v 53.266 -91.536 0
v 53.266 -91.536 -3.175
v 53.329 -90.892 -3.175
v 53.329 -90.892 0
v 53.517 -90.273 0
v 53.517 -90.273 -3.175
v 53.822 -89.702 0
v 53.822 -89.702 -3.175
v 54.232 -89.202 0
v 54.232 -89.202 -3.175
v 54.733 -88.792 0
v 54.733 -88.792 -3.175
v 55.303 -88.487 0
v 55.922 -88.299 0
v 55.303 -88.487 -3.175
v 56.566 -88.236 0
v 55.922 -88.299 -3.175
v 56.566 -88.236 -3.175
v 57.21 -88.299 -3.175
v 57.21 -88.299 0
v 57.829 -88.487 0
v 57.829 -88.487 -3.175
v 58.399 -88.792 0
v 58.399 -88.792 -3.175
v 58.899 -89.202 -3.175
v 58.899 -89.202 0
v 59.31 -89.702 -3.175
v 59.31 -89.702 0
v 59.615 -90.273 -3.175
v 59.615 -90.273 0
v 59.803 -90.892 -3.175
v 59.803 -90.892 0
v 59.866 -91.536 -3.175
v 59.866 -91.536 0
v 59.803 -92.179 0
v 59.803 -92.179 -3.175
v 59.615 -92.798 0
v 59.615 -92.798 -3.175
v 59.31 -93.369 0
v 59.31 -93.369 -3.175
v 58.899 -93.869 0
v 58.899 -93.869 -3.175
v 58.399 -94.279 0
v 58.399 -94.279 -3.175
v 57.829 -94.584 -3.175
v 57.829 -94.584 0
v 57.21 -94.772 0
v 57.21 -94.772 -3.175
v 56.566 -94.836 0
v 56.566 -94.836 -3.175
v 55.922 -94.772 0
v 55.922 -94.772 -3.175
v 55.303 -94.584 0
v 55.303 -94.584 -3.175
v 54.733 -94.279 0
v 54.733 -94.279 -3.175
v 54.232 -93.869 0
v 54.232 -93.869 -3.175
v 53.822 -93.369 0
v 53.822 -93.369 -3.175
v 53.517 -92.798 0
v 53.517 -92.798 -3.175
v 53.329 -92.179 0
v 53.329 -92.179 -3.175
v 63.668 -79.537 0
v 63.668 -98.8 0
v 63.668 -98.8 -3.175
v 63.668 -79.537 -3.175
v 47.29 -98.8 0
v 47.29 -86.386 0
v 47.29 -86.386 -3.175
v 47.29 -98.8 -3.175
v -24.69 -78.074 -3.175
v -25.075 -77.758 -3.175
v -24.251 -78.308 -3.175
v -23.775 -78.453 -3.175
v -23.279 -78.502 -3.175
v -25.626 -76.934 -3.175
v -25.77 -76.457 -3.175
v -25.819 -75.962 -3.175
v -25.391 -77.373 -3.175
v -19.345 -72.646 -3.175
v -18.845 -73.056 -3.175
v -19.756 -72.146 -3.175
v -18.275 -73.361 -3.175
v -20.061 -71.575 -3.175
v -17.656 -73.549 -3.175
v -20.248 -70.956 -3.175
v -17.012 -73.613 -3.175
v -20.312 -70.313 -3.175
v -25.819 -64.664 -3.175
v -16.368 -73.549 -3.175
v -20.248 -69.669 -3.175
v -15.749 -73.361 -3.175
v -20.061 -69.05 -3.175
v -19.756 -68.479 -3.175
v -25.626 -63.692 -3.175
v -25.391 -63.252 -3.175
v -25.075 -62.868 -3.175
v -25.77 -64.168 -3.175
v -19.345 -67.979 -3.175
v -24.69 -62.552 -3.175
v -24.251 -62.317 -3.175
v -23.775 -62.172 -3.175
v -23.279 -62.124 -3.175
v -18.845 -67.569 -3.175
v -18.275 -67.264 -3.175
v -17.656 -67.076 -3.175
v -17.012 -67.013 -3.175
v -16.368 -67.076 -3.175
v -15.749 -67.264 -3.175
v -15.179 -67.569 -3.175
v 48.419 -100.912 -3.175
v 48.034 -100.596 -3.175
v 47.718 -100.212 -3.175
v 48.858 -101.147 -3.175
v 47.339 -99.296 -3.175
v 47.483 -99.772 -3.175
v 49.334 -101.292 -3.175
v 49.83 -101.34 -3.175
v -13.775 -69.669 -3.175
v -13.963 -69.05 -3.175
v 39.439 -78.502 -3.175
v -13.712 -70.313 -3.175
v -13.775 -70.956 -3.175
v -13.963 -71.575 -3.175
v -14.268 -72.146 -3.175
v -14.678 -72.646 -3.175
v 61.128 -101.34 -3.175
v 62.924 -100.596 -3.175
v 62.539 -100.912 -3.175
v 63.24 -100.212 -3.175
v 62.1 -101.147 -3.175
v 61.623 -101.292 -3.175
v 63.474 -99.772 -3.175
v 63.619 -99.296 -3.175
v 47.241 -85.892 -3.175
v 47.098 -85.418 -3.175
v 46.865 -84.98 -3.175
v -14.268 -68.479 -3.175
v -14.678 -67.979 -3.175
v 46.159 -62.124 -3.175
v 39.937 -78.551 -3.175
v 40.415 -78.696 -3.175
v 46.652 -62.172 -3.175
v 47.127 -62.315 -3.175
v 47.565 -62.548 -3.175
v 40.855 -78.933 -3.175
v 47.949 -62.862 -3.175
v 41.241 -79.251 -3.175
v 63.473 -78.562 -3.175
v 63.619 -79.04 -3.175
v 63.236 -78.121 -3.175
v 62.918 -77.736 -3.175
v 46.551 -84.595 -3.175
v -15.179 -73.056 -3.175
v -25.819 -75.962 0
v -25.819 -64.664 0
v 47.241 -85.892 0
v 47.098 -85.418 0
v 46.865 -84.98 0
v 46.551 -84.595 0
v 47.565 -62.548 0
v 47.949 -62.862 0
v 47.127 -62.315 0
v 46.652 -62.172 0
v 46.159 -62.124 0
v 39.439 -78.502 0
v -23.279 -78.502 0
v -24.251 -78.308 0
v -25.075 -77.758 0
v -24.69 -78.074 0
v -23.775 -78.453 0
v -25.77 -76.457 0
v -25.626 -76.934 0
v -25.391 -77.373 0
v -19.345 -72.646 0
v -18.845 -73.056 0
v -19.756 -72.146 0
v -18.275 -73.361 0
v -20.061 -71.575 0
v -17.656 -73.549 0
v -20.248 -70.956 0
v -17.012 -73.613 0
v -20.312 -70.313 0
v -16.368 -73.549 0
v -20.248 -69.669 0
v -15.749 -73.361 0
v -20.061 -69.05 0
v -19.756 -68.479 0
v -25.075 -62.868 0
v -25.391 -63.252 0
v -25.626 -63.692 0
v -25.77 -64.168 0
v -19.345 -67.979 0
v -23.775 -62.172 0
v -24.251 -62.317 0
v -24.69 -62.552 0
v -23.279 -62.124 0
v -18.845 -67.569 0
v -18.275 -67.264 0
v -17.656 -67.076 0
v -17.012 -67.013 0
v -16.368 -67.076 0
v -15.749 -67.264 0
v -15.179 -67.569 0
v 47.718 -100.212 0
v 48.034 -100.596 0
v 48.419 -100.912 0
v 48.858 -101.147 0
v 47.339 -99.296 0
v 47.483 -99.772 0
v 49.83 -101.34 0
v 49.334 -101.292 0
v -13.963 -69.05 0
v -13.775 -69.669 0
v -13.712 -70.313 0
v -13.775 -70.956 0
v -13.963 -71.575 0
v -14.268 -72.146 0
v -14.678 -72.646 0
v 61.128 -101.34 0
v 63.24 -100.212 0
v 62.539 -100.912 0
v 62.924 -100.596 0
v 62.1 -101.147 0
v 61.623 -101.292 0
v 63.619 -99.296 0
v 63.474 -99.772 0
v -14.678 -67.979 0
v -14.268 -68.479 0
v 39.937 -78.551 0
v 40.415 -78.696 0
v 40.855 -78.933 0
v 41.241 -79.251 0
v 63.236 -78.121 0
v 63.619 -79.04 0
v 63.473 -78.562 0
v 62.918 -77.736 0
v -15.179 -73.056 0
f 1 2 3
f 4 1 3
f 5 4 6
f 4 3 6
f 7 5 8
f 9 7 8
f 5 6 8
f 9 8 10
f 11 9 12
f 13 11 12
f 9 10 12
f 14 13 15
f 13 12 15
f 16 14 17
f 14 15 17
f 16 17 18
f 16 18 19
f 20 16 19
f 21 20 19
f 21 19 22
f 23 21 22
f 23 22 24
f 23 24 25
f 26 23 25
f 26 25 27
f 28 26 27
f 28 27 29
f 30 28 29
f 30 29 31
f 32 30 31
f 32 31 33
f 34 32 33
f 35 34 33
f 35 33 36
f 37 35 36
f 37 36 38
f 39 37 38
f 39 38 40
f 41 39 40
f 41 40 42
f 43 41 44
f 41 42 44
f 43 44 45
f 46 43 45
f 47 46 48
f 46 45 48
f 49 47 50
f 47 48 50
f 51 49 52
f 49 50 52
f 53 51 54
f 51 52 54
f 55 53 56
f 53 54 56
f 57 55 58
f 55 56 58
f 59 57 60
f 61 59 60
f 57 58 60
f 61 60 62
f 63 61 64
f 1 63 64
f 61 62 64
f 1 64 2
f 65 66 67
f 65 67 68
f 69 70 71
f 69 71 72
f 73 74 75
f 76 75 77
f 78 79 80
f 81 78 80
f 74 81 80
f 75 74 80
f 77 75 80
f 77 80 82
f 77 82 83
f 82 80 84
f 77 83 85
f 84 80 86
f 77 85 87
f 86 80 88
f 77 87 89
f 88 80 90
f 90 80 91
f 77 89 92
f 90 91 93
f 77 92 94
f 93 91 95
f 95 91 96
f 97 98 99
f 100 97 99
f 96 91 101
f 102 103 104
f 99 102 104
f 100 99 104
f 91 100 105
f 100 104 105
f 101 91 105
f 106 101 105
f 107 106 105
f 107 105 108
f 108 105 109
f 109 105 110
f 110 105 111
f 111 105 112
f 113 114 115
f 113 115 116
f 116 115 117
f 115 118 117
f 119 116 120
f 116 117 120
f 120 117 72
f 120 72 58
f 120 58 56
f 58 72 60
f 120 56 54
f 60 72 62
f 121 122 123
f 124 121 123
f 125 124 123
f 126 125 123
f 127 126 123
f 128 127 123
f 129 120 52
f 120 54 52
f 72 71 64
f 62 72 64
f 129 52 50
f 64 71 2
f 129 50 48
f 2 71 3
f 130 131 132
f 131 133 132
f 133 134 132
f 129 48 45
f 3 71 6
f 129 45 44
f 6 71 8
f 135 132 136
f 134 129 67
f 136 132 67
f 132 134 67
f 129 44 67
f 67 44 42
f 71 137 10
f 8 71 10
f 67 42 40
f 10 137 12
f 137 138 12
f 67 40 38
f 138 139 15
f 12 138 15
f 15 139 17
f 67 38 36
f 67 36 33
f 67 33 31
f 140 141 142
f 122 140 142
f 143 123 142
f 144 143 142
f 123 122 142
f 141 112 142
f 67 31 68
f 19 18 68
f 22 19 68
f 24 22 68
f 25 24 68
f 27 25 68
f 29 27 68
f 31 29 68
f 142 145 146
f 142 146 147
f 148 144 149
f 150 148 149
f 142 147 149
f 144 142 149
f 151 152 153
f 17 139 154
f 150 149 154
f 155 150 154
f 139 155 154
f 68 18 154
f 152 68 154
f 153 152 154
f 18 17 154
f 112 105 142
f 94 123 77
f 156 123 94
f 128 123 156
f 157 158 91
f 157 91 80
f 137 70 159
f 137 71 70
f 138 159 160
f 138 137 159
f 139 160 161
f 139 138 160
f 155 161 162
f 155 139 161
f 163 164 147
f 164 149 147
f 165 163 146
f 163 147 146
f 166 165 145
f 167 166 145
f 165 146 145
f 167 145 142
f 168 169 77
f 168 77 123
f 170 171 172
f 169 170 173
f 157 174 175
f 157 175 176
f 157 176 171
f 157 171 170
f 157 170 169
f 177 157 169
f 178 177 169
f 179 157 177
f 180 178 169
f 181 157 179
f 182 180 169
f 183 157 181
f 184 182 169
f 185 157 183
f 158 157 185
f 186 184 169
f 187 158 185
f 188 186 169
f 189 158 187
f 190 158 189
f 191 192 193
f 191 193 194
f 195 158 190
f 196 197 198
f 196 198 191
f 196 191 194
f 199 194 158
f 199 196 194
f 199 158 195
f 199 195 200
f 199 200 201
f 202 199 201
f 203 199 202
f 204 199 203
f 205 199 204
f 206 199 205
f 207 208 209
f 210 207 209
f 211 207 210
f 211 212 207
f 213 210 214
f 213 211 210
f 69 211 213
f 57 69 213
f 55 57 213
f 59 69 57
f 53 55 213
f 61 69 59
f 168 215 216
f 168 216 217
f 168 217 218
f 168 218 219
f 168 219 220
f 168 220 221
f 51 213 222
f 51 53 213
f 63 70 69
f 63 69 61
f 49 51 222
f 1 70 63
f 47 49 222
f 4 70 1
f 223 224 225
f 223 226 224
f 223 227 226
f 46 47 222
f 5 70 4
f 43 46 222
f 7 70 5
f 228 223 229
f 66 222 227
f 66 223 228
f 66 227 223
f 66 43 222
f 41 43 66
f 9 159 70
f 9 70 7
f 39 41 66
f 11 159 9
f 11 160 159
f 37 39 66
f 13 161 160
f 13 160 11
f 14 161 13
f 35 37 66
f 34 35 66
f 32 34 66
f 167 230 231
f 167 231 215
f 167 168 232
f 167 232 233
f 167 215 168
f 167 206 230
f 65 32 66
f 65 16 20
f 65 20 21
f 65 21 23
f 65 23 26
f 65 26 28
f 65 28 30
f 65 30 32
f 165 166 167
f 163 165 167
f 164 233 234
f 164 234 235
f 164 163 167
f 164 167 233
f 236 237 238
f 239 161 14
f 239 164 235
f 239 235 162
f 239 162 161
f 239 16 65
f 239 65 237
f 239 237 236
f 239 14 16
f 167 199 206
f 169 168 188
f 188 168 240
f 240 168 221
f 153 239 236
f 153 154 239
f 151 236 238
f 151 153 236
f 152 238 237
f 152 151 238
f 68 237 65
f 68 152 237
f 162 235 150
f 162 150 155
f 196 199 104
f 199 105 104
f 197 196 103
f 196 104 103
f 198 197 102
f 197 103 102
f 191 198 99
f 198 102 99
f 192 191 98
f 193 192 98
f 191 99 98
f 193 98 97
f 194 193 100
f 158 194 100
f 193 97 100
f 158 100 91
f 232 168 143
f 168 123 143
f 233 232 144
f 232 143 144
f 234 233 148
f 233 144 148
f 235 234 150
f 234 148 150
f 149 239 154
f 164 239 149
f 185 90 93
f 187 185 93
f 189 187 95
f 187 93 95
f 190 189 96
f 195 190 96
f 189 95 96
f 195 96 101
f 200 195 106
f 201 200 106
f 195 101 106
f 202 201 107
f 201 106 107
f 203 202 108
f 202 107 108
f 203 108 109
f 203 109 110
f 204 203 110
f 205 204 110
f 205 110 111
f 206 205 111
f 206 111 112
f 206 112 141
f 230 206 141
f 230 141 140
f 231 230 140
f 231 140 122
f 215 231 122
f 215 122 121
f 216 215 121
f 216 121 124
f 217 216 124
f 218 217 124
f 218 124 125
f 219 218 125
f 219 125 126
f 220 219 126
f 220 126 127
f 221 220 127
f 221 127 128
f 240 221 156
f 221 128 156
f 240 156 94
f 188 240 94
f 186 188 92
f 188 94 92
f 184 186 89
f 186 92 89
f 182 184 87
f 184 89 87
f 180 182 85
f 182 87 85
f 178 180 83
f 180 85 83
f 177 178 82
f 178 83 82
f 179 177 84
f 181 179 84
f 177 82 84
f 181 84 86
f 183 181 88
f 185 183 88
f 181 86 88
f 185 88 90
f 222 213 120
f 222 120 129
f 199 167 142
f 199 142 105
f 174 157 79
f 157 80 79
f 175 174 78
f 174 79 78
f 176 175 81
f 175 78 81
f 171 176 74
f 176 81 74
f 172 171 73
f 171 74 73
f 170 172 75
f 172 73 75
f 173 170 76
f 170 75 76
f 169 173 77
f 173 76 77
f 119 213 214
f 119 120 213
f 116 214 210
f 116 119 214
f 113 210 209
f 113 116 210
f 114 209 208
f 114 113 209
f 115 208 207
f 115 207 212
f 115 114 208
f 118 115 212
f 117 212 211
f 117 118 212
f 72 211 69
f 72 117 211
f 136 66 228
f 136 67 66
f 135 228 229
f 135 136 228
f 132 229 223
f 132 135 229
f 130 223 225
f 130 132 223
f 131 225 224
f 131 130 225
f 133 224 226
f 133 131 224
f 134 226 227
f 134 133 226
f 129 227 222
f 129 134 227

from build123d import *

# Parameters (mm, degrees)
BASE_FLANGE1_DEPTH   = 3.175
M6_CLEARANCE_HOLE1_D = 6.6
FILLET1_R            = 2.54


# Sheet-metal steps are written as plain solids
with BuildPart() as part:
    # Sketch1 → Base-Flange1 (new body)
    with BuildSketch(Plane.XY):
        Polygon((63.66772505, -78.480441727), (47.205847983, -62.123600001), (-25.819152017, -62.123600001), (-25.819152017, -78.501600001), (40.496105752, -78.501600001), (47.28972505, -85.338441727), (47.28972505, -101.340441727), (63.66772505, -101.340441727), align=None)
    extrude(amount=-BASE_FLANGE1_DEPTH)

    # M6 Clearance Hole1 (through all)
    with Locations(Plane.XY):
        with Locations((56.565919048, -91.535610498), (-17.0119, -70.312600001)):
            Hole(M6_CLEARANCE_HOLE1_D / 2)

    # Fillet1
    fillet1_edges = [part.edges().sort_by_distance(p)[0] for p in [
        (-25.819152017, -62.123600001, -1.5875),
        (47.205847983, -62.123600001, -1.5875),
        (63.66772505, -78.480441727, -1.5875),
        (63.66772505, -101.340441727, -1.5875),
        (47.28972505, -101.340441727, -1.5875),
        (47.28972505, -85.338441727, -1.5875),
        (40.496105752, -78.501600001, -1.5875),
        (-25.819152017, -78.501600001, -1.5875),
    ]]
    fillet(fillet1_edges, radius=FILLET1_R)


solid = part.part
